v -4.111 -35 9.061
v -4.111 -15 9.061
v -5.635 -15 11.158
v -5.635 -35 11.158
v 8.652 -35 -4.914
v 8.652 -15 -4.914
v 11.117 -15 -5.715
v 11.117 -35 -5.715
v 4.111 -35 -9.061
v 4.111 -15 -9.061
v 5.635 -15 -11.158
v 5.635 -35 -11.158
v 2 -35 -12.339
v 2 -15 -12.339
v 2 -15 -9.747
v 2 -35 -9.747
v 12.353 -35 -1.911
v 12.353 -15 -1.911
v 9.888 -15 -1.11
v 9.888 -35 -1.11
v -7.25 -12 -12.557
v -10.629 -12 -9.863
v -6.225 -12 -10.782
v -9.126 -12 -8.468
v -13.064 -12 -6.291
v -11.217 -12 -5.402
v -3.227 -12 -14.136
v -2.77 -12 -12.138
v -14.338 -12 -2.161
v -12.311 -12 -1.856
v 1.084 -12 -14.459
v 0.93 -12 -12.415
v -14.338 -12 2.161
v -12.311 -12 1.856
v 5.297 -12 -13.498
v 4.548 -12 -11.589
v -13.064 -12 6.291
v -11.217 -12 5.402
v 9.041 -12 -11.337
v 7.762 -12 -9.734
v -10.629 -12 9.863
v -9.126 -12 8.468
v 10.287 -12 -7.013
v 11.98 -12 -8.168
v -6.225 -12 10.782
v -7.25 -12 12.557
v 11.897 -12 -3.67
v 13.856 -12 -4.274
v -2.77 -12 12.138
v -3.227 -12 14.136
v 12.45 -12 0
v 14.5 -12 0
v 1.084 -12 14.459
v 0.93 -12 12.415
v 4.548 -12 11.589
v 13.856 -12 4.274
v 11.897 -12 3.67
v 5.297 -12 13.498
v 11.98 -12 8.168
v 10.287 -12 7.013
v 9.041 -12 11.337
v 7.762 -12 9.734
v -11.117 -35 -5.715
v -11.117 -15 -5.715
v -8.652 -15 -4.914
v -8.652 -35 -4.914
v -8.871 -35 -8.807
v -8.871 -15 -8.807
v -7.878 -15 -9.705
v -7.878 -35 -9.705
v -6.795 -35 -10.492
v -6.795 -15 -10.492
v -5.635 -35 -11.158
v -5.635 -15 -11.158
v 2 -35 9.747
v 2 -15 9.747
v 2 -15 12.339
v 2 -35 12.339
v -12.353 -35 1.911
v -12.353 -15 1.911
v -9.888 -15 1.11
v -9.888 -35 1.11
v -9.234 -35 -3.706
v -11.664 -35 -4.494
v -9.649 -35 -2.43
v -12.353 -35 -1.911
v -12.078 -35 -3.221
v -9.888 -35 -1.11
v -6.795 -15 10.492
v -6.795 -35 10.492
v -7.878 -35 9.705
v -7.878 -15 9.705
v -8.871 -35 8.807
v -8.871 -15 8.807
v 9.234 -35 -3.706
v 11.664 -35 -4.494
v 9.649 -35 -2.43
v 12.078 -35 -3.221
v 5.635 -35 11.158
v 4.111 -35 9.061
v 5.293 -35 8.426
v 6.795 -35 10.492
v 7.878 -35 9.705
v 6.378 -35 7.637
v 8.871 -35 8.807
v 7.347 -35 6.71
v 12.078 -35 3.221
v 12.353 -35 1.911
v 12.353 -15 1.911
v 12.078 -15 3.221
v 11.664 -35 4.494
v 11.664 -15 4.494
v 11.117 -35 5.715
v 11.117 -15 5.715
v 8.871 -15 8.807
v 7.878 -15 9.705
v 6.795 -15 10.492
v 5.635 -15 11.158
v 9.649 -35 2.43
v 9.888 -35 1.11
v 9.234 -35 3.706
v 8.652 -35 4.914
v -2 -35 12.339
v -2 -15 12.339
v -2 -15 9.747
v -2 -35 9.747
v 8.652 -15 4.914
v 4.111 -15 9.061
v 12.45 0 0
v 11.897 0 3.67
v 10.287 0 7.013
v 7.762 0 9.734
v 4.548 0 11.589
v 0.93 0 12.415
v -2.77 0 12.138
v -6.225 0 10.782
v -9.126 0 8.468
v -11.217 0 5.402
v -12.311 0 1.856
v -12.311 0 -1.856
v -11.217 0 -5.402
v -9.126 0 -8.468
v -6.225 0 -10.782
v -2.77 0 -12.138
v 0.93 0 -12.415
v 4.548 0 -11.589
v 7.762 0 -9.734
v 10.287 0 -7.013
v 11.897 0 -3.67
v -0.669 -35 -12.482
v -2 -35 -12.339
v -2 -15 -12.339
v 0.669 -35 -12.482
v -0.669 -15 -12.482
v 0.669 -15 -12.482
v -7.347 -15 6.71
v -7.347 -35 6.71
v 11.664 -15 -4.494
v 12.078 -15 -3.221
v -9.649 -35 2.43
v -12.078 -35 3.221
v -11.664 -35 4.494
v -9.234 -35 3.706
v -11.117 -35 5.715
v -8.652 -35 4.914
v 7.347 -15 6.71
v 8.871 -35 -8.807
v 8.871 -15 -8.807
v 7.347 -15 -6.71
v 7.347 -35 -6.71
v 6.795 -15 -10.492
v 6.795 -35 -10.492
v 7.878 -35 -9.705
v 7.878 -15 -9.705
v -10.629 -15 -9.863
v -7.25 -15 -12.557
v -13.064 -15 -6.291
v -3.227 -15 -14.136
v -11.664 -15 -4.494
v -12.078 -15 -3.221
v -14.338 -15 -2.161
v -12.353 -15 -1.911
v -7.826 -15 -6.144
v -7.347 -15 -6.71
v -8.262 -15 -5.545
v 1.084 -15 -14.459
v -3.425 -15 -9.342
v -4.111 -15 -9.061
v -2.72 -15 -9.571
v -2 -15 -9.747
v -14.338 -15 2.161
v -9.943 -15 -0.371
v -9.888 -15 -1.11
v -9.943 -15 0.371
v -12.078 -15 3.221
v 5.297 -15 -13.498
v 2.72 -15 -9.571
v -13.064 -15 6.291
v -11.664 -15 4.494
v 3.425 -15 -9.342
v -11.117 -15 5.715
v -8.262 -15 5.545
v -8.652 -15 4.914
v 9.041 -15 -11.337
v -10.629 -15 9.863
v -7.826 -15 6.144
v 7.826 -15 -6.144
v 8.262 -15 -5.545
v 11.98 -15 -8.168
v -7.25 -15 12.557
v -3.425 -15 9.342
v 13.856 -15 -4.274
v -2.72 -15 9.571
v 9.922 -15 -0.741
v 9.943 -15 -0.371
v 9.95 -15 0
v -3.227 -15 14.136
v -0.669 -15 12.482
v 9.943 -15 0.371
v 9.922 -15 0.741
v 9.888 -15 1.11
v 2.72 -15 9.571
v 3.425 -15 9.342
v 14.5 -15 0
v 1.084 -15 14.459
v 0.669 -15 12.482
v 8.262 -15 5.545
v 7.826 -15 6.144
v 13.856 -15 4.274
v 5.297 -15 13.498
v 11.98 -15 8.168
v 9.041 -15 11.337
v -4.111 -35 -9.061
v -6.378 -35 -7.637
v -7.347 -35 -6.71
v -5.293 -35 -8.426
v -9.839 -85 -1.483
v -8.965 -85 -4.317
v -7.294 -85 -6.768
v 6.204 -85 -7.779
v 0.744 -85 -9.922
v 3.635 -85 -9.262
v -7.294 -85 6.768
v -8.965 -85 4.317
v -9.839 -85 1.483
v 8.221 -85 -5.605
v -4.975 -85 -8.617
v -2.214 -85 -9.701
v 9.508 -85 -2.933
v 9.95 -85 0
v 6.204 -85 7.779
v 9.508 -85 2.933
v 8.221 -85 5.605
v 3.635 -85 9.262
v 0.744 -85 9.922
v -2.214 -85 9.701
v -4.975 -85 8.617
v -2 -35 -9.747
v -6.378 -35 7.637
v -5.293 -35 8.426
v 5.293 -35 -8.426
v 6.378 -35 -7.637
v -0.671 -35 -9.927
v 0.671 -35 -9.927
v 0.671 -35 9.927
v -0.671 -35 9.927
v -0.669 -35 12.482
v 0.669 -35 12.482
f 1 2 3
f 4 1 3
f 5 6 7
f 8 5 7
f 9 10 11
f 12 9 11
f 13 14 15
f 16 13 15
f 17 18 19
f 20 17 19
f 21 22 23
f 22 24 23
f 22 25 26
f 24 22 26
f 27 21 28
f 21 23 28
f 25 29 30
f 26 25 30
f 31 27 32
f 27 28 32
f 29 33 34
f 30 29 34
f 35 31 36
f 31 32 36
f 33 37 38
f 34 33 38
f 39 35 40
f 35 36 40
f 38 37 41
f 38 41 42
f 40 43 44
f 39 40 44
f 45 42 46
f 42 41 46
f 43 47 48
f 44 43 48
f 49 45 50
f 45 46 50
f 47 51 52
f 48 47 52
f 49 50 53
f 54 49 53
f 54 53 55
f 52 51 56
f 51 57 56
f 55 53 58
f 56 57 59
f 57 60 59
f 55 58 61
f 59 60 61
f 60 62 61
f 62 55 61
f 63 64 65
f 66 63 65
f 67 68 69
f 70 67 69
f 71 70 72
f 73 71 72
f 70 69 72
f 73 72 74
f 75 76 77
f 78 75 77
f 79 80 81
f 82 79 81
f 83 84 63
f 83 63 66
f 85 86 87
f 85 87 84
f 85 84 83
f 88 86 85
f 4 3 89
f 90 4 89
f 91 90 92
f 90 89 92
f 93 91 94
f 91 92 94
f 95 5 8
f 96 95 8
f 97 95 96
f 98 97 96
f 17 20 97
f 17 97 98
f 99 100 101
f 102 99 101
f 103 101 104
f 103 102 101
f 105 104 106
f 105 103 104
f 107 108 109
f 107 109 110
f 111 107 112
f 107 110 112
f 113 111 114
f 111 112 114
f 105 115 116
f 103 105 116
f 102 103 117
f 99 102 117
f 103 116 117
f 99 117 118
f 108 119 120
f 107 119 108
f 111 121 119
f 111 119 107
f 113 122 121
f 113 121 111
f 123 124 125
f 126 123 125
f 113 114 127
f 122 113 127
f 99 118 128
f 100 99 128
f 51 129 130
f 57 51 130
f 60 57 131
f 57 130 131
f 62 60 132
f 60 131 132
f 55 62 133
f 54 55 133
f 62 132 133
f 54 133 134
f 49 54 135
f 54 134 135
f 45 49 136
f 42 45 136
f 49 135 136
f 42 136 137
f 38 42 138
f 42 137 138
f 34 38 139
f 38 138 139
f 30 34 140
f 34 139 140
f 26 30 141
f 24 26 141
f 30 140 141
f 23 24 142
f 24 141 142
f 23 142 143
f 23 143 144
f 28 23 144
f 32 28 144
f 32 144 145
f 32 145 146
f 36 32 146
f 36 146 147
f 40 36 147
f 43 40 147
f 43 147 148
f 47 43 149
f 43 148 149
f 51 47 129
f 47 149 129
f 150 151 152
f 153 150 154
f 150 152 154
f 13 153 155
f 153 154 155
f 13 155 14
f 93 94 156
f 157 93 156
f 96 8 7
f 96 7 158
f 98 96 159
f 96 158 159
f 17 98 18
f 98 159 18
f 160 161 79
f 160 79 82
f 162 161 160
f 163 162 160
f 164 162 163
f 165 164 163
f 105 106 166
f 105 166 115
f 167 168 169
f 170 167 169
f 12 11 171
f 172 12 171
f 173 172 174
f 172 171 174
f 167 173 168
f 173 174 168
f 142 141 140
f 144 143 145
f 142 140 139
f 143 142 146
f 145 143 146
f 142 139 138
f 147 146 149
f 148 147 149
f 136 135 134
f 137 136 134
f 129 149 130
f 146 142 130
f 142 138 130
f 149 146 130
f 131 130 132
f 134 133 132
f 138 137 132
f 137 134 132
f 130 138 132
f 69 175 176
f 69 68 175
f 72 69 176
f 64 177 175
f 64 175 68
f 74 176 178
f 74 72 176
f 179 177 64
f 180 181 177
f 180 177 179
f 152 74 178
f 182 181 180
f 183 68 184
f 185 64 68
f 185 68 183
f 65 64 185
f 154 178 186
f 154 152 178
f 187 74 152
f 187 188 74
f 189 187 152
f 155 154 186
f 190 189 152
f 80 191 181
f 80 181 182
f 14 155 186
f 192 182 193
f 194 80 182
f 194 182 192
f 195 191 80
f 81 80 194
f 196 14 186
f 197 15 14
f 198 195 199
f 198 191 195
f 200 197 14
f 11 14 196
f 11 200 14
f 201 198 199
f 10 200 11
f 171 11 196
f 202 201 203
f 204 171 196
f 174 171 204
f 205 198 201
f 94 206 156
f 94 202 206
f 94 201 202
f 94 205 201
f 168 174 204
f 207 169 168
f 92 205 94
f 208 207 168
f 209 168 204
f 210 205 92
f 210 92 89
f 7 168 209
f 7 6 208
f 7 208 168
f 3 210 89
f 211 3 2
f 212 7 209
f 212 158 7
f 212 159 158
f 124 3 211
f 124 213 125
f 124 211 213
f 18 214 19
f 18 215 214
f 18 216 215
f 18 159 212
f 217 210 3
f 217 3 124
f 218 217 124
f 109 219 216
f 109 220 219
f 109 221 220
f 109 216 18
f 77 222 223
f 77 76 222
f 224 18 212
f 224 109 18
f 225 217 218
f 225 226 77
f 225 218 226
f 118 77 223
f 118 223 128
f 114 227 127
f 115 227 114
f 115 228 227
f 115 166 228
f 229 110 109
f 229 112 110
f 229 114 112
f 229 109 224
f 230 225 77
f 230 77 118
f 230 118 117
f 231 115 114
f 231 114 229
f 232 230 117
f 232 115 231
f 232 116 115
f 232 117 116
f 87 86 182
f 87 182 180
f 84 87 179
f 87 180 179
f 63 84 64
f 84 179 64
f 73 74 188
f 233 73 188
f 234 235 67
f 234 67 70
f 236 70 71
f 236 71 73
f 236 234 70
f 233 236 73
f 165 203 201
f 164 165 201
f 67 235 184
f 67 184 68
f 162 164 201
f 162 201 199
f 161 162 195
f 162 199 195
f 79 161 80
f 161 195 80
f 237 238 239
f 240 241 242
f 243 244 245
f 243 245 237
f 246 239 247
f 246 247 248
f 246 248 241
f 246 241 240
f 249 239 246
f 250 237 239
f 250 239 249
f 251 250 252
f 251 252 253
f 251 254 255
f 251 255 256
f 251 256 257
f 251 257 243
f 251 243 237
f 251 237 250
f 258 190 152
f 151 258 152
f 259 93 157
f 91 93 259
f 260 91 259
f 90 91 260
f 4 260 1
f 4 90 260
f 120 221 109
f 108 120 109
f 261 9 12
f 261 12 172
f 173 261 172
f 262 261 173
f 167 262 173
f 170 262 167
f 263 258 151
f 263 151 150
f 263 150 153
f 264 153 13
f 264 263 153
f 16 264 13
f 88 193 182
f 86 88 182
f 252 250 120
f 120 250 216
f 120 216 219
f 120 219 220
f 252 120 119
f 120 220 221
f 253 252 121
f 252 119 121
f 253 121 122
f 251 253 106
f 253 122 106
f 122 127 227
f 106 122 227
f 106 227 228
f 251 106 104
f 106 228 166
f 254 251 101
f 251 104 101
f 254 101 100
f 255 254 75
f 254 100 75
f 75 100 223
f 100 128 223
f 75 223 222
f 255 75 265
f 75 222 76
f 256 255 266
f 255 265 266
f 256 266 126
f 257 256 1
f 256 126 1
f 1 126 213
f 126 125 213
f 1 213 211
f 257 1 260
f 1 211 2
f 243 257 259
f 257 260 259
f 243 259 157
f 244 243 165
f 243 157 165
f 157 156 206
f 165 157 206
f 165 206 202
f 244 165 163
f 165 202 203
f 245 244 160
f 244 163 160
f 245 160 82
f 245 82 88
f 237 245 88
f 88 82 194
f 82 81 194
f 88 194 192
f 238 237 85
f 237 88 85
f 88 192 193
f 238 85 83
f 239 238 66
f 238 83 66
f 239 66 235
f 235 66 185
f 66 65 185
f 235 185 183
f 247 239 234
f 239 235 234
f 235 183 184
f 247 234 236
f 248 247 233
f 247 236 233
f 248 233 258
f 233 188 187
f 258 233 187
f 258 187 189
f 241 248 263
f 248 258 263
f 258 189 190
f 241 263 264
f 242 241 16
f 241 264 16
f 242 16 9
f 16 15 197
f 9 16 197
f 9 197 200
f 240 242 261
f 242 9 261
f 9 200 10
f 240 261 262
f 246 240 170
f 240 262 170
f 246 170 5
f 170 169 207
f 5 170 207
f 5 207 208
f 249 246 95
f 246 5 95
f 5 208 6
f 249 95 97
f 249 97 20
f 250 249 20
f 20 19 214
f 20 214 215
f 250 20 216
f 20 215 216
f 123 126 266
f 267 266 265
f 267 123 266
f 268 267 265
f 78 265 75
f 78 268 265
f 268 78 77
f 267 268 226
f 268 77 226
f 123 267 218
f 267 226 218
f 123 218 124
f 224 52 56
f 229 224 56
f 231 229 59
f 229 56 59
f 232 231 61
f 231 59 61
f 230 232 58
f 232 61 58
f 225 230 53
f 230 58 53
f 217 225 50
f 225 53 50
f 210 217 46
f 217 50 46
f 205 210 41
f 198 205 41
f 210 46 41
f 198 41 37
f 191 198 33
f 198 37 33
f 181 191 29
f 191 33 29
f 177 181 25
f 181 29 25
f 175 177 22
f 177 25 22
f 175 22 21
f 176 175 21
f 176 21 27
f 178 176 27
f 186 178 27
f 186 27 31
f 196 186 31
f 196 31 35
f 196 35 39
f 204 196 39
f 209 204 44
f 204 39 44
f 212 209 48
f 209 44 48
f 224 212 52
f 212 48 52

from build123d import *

# Parameters (mm, degrees)
F0_R     = 12.45
F1_DEPTH = 12
F2_R     = 14.5
F3_DEPTH = 3
F4_R     = 9.95
F5_DEPTH = 70
F7_DEPTH = 20


with BuildPart() as f1:
    # F0 (on Front) → F1 (new body)
    with BuildSketch(Plane.XZ):
        Circle(F0_R)
    extrude(amount=F1_DEPTH)

    # F2 (on face) → F3 (join)
    with BuildSketch(Plane.XZ.offset(12)):
        Circle(F2_R)
    extrude(amount=F3_DEPTH)

    # F4 (on face) → F5 (join)
    with BuildSketch(Plane.XZ.offset(15)):
        Circle(F4_R)
    extrude(amount=F5_DEPTH)

    # F6 (on face) → F7 (join)
    with BuildSketch(Plane.XZ.offset(15)):
        with BuildLine():
            Line((2, 9.7469225913), (2, 12.3389626793))
            ThreePointArc((2, 12.3389626793), (0, 12.5), (-2, 12.3389626793))
            Line((-2, 12.3389626793), (-2, 9.7469225913))
            ThreePointArc((-2, 9.7469225913), (0, 9.95), (2, 9.7469225913))
        make_face()
        with BuildLine():
            ThreePointArc((-7.3471313431, 6.7098555146), (-5.8484632603, 8.049719094), (-4.1110633656, 9.0609965238))
            Line((-4.1110633656, 9.0609965238), (-5.6346263027, 11.1580010051))
            ThreePointArc((-5.6346263027, 11.1580010051), (-7.3473156537, 10.1127124297), (-8.8706942802, 8.8068599959))
            Line((-8.8706942802, 8.8068599959), (-7.3471313431, 6.7098555146))
        make_face()
        with BuildLine():
            ThreePointArc((-9.887908233, 1.109851691), (-9.4630123371, 3.074719094), (-8.6518402555, 4.9140777561))
            Line((-8.6518402555, 4.9140777561), (-11.1170168717, 5.7150621934))
            ThreePointArc((-11.1170168717, 5.7150621934), (-11.8882064537, 3.8627124297), (-12.3530848492, 1.9108361283))
            Line((-12.3530848492, 1.9108361283), (-9.887908233, 1.109851691))
        make_face()
        with BuildLine():
            ThreePointArc((-8.6518402555, -4.9140777561), (-9.4630123371, -3.074719094), (-9.887908233, -1.109851691))
            Line((-9.887908233, -1.109851691), (-12.3530848492, -1.9108361283))
            ThreePointArc((-12.3530848492, -1.9108361283), (-11.8882064537, -3.8627124297), (-11.1170168717, -5.7150621934))
            Line((-11.1170168717, -5.7150621934), (-8.6518402555, -4.9140777561))
        make_face()
        with BuildLine():
            ThreePointArc((-4.1110633656, -9.0609965238), (-5.8484632603, -8.049719094), (-7.3471313431, -6.7098555146))
            Line((-7.3471313431, -6.7098555146), (-8.8706942802, -8.8068599959))
            ThreePointArc((-8.8706942802, -8.8068599959), (-7.3473156537, -10.1127124297), (-5.6346263027, -11.1580010051))
            Line((-5.6346263027, -11.1580010051), (-4.1110633656, -9.0609965238))
        make_face()
        with BuildLine():
            ThreePointArc((2, -9.7469225913), (0, -9.95), (-2, -9.7469225913))
            Line((-2, -9.7469225913), (-2, -12.3389626793))
            ThreePointArc((-2, -12.3389626793), (0, -12.5), (2, -12.3389626793))
            Line((2, -12.3389626793), (2, -9.7469225913))
        make_face()
        with BuildLine():
            Line((8.8706942802, -8.8068599959), (7.3471313431, -6.7098555146))
            ThreePointArc((7.3471313431, -6.7098555146), (5.8484632603, -8.049719094), (4.1110633656, -9.0609965238))
            Line((4.1110633656, -9.0609965238), (5.6346263027, -11.1580010051))
            ThreePointArc((5.6346263027, -11.1580010051), (7.3473156537, -10.1127124297), (8.8706942802, -8.8068599959))
        make_face()
        with BuildLine():
            Line((12.3530848492, -1.9108361283), (9.887908233, -1.109851691))
            ThreePointArc((9.887908233, -1.109851691), (9.4630123371, -3.074719094), (8.6518402555, -4.9140777561))
            Line((8.6518402555, -4.9140777561), (11.1170168717, -5.7150621934))
            ThreePointArc((11.1170168717, -5.7150621934), (11.8882064537, -3.8627124297), (12.3530848492, -1.9108361283))
        make_face()
        with BuildLine():
            Line((11.1170168717, 5.7150621934), (8.6518402555, 4.9140777561))
            ThreePointArc((8.6518402555, 4.9140777561), (9.4630123371, 3.074719094), (9.887908233, 1.109851691))
            Line((9.887908233, 1.109851691), (12.3530848492, 1.9108361283))
            ThreePointArc((12.3530848492, 1.9108361283), (11.8882064537, 3.8627124297), (11.1170168717, 5.7150621934))
        make_face()
        with BuildLine():
            Line((5.6346263027, 11.1580010051), (4.1110633656, 9.0609965238))
            ThreePointArc((4.1110633656, 9.0609965238), (5.8484632603, 8.049719094), (7.3471313431, 6.7098555146))
            Line((7.3471313431, 6.7098555146), (8.8706942802, 8.8068599959))
            ThreePointArc((8.8706942802, 8.8068599959), (7.3473156537, 10.1127124297), (5.6346263027, 11.1580010051))
        make_face()
    extrude(amount=F7_DEPTH)


solid = f1.part
